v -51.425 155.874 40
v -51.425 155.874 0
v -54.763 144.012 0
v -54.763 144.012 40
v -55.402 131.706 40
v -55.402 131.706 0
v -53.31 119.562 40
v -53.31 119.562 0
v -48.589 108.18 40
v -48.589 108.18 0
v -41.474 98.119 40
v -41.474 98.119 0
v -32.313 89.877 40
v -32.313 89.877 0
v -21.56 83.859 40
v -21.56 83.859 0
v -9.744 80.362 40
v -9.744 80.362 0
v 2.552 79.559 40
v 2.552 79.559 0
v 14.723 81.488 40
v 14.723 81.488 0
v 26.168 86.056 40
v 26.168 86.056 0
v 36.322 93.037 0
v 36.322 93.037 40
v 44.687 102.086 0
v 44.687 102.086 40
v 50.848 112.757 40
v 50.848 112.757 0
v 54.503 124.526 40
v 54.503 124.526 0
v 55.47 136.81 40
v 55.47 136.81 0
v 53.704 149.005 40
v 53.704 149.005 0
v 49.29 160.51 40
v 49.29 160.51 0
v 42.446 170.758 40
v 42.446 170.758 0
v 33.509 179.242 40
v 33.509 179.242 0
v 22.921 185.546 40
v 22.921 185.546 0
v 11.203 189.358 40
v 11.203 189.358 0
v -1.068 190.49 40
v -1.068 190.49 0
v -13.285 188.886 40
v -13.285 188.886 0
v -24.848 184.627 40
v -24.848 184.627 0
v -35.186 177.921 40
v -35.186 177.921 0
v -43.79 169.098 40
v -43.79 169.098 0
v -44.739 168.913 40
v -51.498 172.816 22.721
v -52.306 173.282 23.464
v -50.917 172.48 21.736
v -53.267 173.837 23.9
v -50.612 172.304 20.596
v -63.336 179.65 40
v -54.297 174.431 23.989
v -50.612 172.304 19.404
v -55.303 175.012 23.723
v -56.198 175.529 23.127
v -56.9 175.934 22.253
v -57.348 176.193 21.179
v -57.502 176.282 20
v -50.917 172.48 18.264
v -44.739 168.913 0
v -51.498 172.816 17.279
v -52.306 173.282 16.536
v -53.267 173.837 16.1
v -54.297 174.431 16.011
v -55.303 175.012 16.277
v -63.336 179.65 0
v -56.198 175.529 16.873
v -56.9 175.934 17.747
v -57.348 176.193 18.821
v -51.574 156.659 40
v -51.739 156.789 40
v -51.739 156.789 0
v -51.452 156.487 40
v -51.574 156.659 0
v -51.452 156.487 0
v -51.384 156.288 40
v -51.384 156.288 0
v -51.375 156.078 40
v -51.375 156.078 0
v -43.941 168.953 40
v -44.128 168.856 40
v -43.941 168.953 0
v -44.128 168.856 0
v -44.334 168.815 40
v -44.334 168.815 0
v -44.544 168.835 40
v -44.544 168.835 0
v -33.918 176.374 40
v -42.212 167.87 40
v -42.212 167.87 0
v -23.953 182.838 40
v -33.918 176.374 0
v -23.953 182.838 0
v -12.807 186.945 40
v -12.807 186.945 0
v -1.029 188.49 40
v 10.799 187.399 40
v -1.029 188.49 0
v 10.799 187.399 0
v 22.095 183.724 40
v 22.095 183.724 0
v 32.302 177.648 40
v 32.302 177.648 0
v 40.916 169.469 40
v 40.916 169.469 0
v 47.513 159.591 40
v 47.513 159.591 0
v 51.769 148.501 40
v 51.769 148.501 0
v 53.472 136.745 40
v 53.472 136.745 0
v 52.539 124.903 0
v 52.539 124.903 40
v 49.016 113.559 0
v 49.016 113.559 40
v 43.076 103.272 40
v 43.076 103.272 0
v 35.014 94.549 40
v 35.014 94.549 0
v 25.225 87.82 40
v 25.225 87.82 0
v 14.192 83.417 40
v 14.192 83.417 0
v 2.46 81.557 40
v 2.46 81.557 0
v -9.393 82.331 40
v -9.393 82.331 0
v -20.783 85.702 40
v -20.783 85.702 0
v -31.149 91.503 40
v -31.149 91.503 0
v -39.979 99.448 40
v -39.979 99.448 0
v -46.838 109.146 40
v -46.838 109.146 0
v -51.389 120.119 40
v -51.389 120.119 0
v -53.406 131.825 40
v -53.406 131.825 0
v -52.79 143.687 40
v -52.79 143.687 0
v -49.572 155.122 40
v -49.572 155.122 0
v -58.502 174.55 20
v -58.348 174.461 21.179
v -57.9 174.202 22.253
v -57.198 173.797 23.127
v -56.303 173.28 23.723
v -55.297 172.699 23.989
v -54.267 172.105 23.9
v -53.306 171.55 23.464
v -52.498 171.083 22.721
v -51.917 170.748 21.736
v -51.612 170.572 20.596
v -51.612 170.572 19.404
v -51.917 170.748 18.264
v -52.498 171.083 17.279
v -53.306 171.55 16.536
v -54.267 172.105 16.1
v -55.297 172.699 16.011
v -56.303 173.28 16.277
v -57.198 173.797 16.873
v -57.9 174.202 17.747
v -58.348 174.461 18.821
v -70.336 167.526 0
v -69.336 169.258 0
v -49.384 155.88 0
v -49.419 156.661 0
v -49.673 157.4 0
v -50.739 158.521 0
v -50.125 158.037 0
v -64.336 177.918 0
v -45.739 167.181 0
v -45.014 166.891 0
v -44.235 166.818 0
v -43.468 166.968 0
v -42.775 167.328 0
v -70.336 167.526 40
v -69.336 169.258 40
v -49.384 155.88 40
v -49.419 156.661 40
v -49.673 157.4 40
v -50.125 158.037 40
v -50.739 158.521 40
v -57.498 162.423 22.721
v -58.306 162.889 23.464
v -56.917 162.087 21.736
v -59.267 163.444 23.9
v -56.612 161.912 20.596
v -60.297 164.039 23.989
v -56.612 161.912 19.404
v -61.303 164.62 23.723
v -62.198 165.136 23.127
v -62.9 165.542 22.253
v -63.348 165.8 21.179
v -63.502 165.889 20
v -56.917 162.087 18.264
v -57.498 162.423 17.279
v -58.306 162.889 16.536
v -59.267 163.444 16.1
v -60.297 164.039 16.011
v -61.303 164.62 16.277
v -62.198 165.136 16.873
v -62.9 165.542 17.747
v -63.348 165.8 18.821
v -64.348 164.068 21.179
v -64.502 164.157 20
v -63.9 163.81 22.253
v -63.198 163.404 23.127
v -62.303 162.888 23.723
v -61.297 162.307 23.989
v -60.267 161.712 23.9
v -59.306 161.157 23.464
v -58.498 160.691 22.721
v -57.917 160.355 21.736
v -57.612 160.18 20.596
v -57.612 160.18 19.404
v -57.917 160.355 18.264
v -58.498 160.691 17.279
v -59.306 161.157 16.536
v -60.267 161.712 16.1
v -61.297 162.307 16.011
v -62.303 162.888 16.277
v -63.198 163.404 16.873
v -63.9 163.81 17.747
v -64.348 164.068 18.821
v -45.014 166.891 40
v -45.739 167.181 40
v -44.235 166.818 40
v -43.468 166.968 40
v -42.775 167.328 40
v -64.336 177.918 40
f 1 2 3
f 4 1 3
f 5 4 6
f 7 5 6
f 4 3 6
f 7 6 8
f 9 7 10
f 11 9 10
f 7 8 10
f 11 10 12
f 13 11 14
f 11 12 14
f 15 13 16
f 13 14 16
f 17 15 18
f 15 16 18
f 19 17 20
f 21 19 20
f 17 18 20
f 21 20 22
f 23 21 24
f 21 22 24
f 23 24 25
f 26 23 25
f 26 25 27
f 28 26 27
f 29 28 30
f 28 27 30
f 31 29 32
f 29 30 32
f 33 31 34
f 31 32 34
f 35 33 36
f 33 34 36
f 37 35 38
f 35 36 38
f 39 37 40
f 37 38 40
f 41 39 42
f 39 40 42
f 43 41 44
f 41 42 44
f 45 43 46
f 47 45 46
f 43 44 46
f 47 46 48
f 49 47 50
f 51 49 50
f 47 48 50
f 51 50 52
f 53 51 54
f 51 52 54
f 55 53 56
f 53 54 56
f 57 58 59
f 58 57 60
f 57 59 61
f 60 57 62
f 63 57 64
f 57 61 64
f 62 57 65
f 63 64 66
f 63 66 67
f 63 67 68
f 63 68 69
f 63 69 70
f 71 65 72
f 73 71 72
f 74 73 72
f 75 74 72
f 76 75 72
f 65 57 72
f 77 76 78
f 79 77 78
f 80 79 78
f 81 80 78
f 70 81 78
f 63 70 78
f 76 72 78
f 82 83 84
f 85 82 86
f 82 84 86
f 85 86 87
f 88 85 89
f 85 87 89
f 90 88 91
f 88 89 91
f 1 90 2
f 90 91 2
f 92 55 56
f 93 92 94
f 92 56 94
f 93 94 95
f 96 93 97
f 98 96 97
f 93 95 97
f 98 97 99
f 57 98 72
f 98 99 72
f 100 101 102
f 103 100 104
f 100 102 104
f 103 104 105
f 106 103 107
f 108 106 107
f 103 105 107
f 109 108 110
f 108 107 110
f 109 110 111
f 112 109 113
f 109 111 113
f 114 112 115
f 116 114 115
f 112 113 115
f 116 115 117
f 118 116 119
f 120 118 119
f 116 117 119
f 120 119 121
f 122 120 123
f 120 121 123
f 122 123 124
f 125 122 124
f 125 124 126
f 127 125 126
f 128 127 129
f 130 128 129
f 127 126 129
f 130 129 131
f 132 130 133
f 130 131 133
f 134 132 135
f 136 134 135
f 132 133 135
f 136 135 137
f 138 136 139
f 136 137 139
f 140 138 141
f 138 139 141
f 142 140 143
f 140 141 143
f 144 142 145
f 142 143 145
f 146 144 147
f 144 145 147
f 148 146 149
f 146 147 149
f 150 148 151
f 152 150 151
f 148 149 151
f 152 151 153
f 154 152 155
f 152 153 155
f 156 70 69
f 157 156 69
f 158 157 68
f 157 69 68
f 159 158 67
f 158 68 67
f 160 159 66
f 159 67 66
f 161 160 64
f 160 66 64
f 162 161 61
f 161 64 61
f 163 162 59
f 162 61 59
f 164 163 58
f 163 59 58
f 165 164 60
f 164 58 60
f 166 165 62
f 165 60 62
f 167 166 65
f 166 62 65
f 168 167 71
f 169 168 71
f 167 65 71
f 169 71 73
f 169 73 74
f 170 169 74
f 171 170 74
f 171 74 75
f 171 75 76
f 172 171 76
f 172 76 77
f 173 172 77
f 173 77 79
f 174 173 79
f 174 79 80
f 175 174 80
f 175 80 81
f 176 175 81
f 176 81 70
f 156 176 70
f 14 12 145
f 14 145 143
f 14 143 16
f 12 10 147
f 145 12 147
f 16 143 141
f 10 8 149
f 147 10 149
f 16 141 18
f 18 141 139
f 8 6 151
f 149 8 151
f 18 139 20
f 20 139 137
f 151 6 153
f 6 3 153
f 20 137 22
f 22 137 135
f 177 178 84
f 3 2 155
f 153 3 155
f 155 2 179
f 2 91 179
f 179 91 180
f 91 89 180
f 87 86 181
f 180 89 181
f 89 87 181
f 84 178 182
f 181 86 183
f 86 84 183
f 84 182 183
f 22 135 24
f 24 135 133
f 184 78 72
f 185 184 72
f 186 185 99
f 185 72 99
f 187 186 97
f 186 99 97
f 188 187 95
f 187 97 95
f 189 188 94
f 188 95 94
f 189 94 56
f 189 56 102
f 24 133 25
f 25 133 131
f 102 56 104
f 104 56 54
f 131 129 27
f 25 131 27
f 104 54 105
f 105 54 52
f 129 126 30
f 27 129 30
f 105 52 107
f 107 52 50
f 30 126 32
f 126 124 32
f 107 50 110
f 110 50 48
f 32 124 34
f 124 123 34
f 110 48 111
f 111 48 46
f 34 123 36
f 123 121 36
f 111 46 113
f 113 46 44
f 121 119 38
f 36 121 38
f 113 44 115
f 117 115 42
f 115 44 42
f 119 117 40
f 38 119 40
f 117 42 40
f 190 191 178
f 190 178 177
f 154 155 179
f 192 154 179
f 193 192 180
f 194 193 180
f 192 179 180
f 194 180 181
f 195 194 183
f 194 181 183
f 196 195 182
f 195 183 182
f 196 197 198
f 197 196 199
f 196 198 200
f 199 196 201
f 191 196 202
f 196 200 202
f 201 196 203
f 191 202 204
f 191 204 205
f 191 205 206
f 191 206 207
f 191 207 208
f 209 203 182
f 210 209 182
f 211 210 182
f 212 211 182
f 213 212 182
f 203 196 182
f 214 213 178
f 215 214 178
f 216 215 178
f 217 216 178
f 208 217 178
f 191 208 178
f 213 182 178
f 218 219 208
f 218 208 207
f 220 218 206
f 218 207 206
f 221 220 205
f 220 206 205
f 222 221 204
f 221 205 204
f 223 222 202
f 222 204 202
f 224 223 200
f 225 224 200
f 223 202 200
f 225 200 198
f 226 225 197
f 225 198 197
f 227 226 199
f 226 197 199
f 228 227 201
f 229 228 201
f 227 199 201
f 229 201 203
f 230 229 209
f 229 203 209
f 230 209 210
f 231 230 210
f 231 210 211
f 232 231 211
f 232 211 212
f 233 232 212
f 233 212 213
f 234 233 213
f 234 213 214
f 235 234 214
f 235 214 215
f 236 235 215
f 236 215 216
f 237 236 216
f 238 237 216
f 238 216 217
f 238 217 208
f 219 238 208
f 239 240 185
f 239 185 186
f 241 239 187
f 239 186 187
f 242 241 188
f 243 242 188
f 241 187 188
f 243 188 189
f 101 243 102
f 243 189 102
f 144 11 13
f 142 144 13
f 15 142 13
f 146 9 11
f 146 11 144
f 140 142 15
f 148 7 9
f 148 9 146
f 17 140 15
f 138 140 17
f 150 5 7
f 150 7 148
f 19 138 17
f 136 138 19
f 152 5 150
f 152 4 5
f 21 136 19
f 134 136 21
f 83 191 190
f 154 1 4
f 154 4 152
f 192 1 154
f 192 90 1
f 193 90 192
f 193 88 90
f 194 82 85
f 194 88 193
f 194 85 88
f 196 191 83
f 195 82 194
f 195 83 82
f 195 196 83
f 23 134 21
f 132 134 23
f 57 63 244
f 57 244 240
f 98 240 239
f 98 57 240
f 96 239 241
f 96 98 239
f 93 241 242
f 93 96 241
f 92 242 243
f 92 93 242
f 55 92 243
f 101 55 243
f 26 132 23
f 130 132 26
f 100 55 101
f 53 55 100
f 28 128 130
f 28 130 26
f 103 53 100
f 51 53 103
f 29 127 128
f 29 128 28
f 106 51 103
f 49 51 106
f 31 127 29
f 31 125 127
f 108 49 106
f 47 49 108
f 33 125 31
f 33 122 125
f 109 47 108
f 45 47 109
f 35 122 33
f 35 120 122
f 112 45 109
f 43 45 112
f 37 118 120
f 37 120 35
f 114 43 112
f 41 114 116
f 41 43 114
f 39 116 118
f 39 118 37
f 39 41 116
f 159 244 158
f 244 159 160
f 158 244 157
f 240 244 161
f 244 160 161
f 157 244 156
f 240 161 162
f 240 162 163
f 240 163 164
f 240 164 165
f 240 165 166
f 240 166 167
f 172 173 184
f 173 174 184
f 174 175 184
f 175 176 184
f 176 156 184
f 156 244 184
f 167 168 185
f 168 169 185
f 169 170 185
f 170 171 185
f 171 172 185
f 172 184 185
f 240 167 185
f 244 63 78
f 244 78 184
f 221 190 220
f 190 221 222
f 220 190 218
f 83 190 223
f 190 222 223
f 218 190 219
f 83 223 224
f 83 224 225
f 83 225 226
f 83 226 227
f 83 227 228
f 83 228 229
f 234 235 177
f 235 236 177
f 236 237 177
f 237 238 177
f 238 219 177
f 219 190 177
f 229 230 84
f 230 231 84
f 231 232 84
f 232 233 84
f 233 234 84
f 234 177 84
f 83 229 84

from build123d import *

# Parameters (mm, degrees)
SM_BASE_FLANGE_1_DEPTH = 40
SKETCH_6_R             = 4
CUT_EXTRUDE_1_DEPTH    = 162.312299626


# Read off the part's stored shape, not the designer's step: Базовая кромка1
with BuildPart() as part:
    # Базовая кромка1 outline → Базовая кромка1 (new body)
    with BuildSketch(Plane.XY):
        with BuildLine():
            Line((-44.739249061, 168.913121258), (-63.336309448, 179.650139078))
            Line((-63.336309448, 179.650139078), (-64.336309448, 177.91808827))
            Line((-64.336309448, 177.91808827), (-45.739249061, 167.18107045))
            ThreePointArc((-45.739249061, 167.18107045), (-43.846610356, 166.865137493), (-42.211758442, 167.869704125))
            ThreePointArc((-42.211758442, 167.869704125), (46.332359104, 108.250000003), (-49.571878008, 155.121603086))
            ThreePointArc((-49.571878008, 155.121603086), (-49.519323742, 157.039709692), (-50.739249061, 158.520816412))
            Line((-50.739249061, 158.520816412), (-69.336309448, 169.257834232))
            Line((-69.336309448, 169.257834232), (-70.336309448, 167.525783425))
            Line((-70.336309448, 167.525783425), (-51.739249061, 156.788765605))
            ThreePointArc((-51.739249061, 156.788765605), (-51.410886498, 156.390101858), (-51.425032326, 155.873812548))
            ThreePointArc((-51.425032326, 155.873812548), (48.064409909, 107.249999999), (-43.789768103, 169.098478111))
            ThreePointArc((-43.789768103, 169.098478111), (-44.229814847, 168.82808281), (-44.739249061, 168.913121258))
        make_face()
    extrude(amount=SM_BASE_FLANGE_1_DEPTH)

    # Эскиз6 → Вырез-Вытянуть1 (cut, through all)
    with BuildSketch(Plane(origin=(61.956714755, 107.312177826, 0), x_dir=(0.8660254037844433, -0.499999999999992, 0), z_dir=(0.499999999999992, 0.8660254037844433, 0))):
        with Locations(Location((-133.938904682, -20, 0), (0, 0, 180))):
            Circle(SKETCH_6_R)
    extrude(amount=-CUT_EXTRUDE_1_DEPTH, mode=Mode.SUBTRACT)


solid = part.part
